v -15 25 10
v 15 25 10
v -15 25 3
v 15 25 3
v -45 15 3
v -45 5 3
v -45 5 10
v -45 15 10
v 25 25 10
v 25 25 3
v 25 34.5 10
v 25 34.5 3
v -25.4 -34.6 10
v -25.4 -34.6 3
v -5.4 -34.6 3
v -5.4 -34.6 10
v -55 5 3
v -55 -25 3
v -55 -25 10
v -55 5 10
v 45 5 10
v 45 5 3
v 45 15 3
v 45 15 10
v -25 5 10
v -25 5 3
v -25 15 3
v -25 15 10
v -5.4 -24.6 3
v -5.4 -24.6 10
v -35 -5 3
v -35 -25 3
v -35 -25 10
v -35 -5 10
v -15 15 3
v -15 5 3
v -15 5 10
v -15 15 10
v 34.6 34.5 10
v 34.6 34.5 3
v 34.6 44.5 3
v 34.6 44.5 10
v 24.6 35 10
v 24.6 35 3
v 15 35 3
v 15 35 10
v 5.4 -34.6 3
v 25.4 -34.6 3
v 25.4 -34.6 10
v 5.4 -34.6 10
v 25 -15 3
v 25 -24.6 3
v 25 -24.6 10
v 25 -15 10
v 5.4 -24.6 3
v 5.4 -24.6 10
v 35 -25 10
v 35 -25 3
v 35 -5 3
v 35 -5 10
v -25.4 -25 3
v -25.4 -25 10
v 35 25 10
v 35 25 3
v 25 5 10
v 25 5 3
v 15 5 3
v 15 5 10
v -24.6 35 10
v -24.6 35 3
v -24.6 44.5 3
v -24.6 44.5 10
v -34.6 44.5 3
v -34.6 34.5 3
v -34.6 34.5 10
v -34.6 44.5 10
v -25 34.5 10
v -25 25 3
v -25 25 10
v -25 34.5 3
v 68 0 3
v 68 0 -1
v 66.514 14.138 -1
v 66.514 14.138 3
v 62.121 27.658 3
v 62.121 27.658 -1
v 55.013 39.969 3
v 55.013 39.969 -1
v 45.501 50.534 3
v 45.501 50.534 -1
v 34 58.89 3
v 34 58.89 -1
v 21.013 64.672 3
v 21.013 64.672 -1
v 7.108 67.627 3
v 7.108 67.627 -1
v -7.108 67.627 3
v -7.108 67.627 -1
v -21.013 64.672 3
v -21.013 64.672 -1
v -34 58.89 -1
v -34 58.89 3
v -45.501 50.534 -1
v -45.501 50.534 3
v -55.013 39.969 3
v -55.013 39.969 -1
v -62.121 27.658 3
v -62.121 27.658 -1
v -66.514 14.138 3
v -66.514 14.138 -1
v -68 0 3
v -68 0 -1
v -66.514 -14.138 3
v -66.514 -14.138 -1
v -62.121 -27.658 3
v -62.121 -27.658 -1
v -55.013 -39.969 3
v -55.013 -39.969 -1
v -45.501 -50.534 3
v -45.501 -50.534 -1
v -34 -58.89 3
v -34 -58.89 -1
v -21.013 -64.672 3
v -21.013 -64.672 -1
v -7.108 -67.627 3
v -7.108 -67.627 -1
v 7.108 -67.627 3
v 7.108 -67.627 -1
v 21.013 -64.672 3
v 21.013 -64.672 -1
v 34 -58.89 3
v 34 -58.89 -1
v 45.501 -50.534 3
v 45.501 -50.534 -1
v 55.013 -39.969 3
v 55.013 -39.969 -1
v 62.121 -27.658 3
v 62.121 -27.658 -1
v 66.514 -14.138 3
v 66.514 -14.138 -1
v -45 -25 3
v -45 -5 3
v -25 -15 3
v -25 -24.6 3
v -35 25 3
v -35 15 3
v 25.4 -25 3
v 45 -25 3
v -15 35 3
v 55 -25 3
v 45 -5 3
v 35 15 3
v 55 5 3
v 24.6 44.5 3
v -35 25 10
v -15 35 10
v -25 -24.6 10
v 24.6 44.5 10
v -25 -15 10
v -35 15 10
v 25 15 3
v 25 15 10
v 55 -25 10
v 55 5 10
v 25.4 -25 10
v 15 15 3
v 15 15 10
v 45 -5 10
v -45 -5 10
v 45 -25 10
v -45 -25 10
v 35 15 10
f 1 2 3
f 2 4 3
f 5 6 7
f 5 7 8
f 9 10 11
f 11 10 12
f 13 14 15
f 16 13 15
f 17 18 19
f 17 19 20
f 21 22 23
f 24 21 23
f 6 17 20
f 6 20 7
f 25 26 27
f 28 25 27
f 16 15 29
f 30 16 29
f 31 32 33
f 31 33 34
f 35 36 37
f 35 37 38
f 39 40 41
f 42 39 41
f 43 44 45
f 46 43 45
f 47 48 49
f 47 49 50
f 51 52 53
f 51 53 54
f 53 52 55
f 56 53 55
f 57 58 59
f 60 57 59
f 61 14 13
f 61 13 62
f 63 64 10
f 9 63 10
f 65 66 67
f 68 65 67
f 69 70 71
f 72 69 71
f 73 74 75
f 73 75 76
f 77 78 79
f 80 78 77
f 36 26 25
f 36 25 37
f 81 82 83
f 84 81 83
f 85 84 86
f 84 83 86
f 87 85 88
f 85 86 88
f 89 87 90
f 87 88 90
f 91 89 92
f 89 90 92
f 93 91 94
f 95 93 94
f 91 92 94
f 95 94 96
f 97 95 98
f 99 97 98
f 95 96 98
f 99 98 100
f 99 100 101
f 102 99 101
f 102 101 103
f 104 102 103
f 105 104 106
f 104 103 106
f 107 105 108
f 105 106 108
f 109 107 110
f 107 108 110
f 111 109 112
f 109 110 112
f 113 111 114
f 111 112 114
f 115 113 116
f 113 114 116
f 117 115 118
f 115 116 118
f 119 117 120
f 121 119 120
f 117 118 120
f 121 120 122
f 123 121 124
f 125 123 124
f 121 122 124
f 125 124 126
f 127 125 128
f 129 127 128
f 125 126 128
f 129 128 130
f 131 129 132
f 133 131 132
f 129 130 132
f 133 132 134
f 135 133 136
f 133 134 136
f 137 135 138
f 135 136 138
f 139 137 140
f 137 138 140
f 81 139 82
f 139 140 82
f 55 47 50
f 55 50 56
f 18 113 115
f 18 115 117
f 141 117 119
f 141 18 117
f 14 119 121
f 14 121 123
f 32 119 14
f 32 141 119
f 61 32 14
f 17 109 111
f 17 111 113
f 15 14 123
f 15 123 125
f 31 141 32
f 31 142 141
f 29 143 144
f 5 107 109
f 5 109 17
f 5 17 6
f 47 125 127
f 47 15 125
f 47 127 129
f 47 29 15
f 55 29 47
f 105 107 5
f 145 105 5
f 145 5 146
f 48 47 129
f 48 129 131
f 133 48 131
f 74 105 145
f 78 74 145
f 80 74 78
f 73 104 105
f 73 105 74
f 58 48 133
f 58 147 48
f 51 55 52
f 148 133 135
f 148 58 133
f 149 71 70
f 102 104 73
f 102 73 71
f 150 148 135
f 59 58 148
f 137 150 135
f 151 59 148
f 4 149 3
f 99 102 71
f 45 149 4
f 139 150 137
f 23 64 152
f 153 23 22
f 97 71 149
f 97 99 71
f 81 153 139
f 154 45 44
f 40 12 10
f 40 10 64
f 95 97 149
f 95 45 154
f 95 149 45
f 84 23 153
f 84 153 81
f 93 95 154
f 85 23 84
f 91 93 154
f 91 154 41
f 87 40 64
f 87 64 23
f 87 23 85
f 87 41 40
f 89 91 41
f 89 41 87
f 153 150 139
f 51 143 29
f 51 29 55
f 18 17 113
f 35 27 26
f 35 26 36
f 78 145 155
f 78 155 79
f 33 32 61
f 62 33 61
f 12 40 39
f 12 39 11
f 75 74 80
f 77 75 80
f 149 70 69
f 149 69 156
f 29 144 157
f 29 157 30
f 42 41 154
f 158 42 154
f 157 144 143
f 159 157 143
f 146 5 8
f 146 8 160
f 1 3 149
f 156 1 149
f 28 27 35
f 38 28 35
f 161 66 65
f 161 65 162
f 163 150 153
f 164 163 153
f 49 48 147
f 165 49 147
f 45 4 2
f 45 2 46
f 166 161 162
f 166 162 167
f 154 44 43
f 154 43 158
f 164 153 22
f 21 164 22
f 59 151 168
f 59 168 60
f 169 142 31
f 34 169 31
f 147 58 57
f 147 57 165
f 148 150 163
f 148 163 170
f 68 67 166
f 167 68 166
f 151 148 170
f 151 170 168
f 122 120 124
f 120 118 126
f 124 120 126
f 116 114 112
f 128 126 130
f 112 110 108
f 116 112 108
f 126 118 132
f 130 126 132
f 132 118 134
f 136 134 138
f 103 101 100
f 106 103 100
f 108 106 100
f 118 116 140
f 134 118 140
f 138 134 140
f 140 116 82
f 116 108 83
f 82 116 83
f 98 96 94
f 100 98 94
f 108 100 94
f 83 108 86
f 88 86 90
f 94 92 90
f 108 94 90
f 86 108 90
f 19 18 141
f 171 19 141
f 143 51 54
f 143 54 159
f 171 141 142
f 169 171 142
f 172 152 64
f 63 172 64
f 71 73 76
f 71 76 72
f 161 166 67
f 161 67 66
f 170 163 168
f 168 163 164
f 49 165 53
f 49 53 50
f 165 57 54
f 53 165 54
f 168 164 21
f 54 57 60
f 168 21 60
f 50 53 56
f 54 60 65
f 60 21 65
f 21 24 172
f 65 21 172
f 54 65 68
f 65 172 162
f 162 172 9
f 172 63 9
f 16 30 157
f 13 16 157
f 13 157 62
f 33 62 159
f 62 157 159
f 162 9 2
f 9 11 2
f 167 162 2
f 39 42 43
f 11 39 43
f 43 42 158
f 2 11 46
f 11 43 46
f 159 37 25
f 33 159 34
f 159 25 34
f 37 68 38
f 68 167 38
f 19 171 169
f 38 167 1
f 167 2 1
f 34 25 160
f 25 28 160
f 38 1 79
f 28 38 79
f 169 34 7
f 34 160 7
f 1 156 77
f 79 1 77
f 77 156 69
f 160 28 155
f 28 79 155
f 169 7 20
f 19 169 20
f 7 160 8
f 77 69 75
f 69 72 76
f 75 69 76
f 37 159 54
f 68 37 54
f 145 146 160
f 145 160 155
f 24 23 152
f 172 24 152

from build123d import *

# Parameters (mm, degrees)
BOX011_W       = 10
BOX011_H       = 10
BOX011_DEPTH   = 10
BOX012_W       = 10
BOX012_H       = 10
BOX012_DEPTH   = 10
BOX001_W       = 10
BOX001_H       = 10
BOX001_DEPTH   = 10
BOX003_W       = 10
BOX003_H       = 10
BOX003_DEPTH   = 10
BOX020_W       = 10
BOX020_H       = 10
BOX020_DEPTH   = 10
BOX019_W       = 10
BOX019_H       = 10
BOX019_DEPTH   = 10
BOX024_W       = 10
BOX024_H       = 10
BOX024_DEPTH   = 10
BOX017_W       = 10
BOX017_H       = 10
BOX017_DEPTH   = 10
BOX007_W       = 10
BOX007_H       = 10
BOX007_DEPTH   = 10
BOX013_W       = 10
BOX013_H       = 10
BOX013_DEPTH   = 10
BOX006_W       = 10
BOX006_H       = 10
BOX006_DEPTH   = 10
BOX005_W       = 10
BOX005_H       = 10
BOX005_DEPTH   = 10
BOX002_W       = 10
BOX002_H       = 10
BOX002_DEPTH   = 10
BOX015_W       = 10
BOX015_H       = 10
BOX015_DEPTH   = 10
BOX023_W       = 10
BOX023_H       = 10
BOX023_DEPTH   = 10
BOX004_W       = 10
BOX004_H       = 10
BOX004_DEPTH   = 10
BOX014_W       = 10
BOX014_H       = 10
BOX014_DEPTH   = 10
BOX009_W       = 10
BOX009_H       = 10
BOX009_DEPTH   = 10
BOX016_W       = 10
BOX016_H       = 10
BOX016_DEPTH   = 10
BOX010_W       = 10
BOX010_H       = 10
BOX010_DEPTH   = 10
BOX_W          = 10
BOX_H          = 10
BOX_DEPTH      = 10
BOX022_W       = 10
BOX022_H       = 10
BOX022_DEPTH   = 10
BOX018_W       = 10
BOX018_H       = 10
BOX018_DEPTH   = 10
BOX021_W       = 10
BOX021_H       = 10
BOX021_DEPTH   = 10
BOX008_W       = 10
BOX008_H       = 10
BOX008_DEPTH   = 10
CYLINDER_R     = 68
CYLINDER_DEPTH = 4


with BuildPart() as cubo011:
    # Box011 → Box011 (new body)
    with BuildSketch(Plane(origin=(-25, -5, 0), x_dir=(1, 0, 0), z_dir=(0, 0, 1))):
        with Locations((5, 5)):
            Rectangle(BOX011_W, BOX011_H)
    extrude(amount=BOX011_DEPTH)


with BuildPart() as cubo012:
    # Box012 → Box012 (new body)
    with BuildSketch(Plane(origin=(-15, -5, 0), x_dir=(1, 0, 0), z_dir=(0, 0, 1))):
        with Locations((5, 5)):
            Rectangle(BOX012_W, BOX012_H)
    extrude(amount=BOX012_DEPTH)


with BuildPart() as cubo001:
    # Box001 → Box001 (new body)
    with BuildSketch(Plane(origin=(-34.6, 34.5, 0), x_dir=(1, 0, 0), z_dir=(0, 0, 1))):
        with Locations((5, 5)):
            Rectangle(BOX001_W, BOX001_H)
    extrude(amount=BOX001_DEPTH)


with BuildPart() as cubo003:
    # Box003 → Box003 (new body)
    with BuildSketch(Plane(origin=(-25, 15, 0), x_dir=(1, 0, 0), z_dir=(0, 0, 1))):
        with Locations((5, 5)):
            Rectangle(BOX003_W, BOX003_H)
    extrude(amount=BOX003_DEPTH)


with BuildPart() as cubo020:
    # Box020 → Box020 (new body)
    with BuildSketch(Plane(origin=(-15.4, -34.6, 0), x_dir=(1, 0, 0), z_dir=(0, 0, 1))):
        with Locations((5, 5)):
            Rectangle(BOX020_W, BOX020_H)
    extrude(amount=BOX020_DEPTH)


with BuildPart() as cubo019:
    # Box019 → Box019 (new body)
    with BuildSketch(Plane(origin=(-25.4, -34.6, 0), x_dir=(1, 0, 0), z_dir=(0, 0, 1))):
        with Locations((5, 5)):
            Rectangle(BOX019_W, BOX019_H)
    extrude(amount=BOX019_DEPTH)


with BuildPart() as cubo024:
    # Box024 → Box024 (new body)
    with BuildSketch(Plane(origin=(-5, -15, 0), x_dir=(1, 0, 0), z_dir=(0, 0, 1))):
        with Locations((5, 5)):
            Rectangle(BOX024_W, BOX024_H)
    extrude(amount=BOX024_DEPTH)


with BuildPart() as cubo017:
    # Box017 → Box017 (new body)
    with BuildSketch(Plane(origin=(-25, -15, 0), x_dir=(1, 0, 0), z_dir=(0, 0, 1))):
        with Locations((5, 5)):
            Rectangle(BOX017_W, BOX017_H)
    extrude(amount=BOX017_DEPTH)


with BuildPart() as cubo007:
    # Box007 → Box007 (new body)
    with BuildSketch(Plane(origin=(-15, 5, 0), x_dir=(1, 0, 0), z_dir=(0, 0, 1))):
        with Locations((5, 5)):
            Rectangle(BOX007_W, BOX007_H)
    extrude(amount=BOX007_DEPTH)


with BuildPart() as cubo013:
    # Box013 → Box013 (new body)
    with BuildSketch(Plane(origin=(-55, -15, 0), x_dir=(1, 0, 0), z_dir=(0, 0, 1))):
        with Locations((5, 5)):
            Rectangle(BOX013_W, BOX013_H)
    extrude(amount=BOX013_DEPTH)


with BuildPart() as cubo006:
    # Box006 → Box006 (new body)
    with BuildSketch(Plane(origin=(-35, 5, 0), x_dir=(1, 0, 0), z_dir=(0, 0, 1))):
        with Locations((5, 5)):
            Rectangle(BOX006_W, BOX006_H)
    extrude(amount=BOX006_DEPTH)


with BuildPart() as cubo005:
    # Box005 → Box005 (new body)
    with BuildSketch(Plane(origin=(-45, 5, 0), x_dir=(1, 0, 0), z_dir=(0, 0, 1))):
        with Locations((5, 5)):
            Rectangle(BOX005_W, BOX005_H)
    extrude(amount=BOX005_DEPTH)


with BuildPart() as cubo002:
    # Box002 → Box002 (new body)
    with BuildSketch(Plane(origin=(-25, 25, 0), x_dir=(1, 0, 0), z_dir=(0, 0, 1))):
        with Locations((5, 5)):
            Rectangle(BOX002_W, BOX002_H)
    extrude(amount=BOX002_DEPTH)


with BuildPart() as cubo015:
    # Box015 → Box015 (new body)
    with BuildSketch(Plane(origin=(-35, -15, 0), x_dir=(1, 0, 0), z_dir=(0, 0, 1))):
        with Locations((5, 5)):
            Rectangle(BOX015_W, BOX015_H)
    extrude(amount=BOX015_DEPTH)


with BuildPart() as cubo023:
    # Box023 → Box023 (new body)
    with BuildSketch(Plane(origin=(-5, -5, 0), x_dir=(1, 0, 0), z_dir=(0, 0, 1))):
        with Locations((5, 5)):
            Rectangle(BOX023_W, BOX023_H)
    extrude(amount=BOX023_DEPTH)


with BuildPart() as cubo004:
    # Box004 → Box004 (new body)
    with BuildSketch(Plane(origin=(-15, 15, 0), x_dir=(1, 0, 0), z_dir=(0, 0, 1))):
        with Locations((5, 5)):
            Rectangle(BOX004_W, BOX004_H)
    extrude(amount=BOX004_DEPTH)


with BuildPart() as cubo014:
    # Box014 → Box014 (new body)
    with BuildSketch(Plane(origin=(-55, -25, 0), x_dir=(1, 0, 0), z_dir=(0, 0, 1))):
        with Locations((5, 5)):
            Rectangle(BOX014_W, BOX014_H)
    extrude(amount=BOX014_DEPTH)


with BuildPart() as cubo009:
    # Box009 → Box009 (new body)
    with BuildSketch(Plane(origin=(-45, -5, 0), x_dir=(1, 0, 0), z_dir=(0, 0, 1))):
        with Locations((5, 5)):
            Rectangle(BOX009_W, BOX009_H)
    extrude(amount=BOX009_DEPTH)


with BuildPart() as cubo016:
    # Box016 → Box016 (new body)
    with BuildSketch(Plane(origin=(-35, -25, 0), x_dir=(1, 0, 0), z_dir=(0, 0, 1))):
        with Locations((5, 5)):
            Rectangle(BOX016_W, BOX016_H)
    extrude(amount=BOX016_DEPTH)


with BuildPart() as cubo010:
    # Box010 → Box010 (new body)
    with BuildSketch(Plane(origin=(-35, -5, 0), x_dir=(1, 0, 0), z_dir=(0, 0, 1))):
        with Locations((5, 5)):
            Rectangle(BOX010_W, BOX010_H)
    extrude(amount=BOX010_DEPTH)


with BuildPart() as cubo:
    # Box → Box (new body)
    with BuildSketch(Plane(origin=(-35, 15, 0), x_dir=(1, 0, 0), z_dir=(0, 0, 1))):
        with Locations((5, 5)):
            Rectangle(BOX_W, BOX_H)
    extrude(amount=BOX_DEPTH)


with BuildPart() as cubo022:
    # Box022 → Box022 (new body)
    with BuildSketch(Plane(origin=(-5, 5, 0), x_dir=(1, 0, 0), z_dir=(0, 0, 1))):
        with Locations((5, 5)):
            Rectangle(BOX022_W, BOX022_H)
    extrude(amount=BOX022_DEPTH)


with BuildPart() as cubo018:
    # Box018 → Box018 (new body)
    with BuildSketch(Plane(origin=(-15, -15, 0), x_dir=(1, 0, 0), z_dir=(0, 0, 1))):
        with Locations((5, 5)):
            Rectangle(BOX018_W, BOX018_H)
    extrude(amount=BOX018_DEPTH)


with BuildPart() as cubo021:
    # Box021 → Box021 (new body)
    with BuildSketch(Plane(origin=(-5, 15, 0), x_dir=(1, 0, 0), z_dir=(0, 0, 1))):
        with Locations((5, 5)):
            Rectangle(BOX021_W, BOX021_H)
    extrude(amount=BOX021_DEPTH)


with BuildPart() as lado_izdo:
    # Box008 → Box008 (new body)
    with BuildSketch(Plane(origin=(-55, -5, 0), x_dir=(1, 0, 0), z_dir=(0, 0, 1))):
        with Locations((5, 5)):
            Rectangle(BOX008_W, BOX008_H)
    extrude(amount=BOX008_DEPTH)

    # Fusion: union Cubo011, Cubo012, Cubo001, Cubo003, Cubo020, Cubo019, Cubo024, Cubo017, Cubo007, Cubo013, Cubo006, Cubo005, Cubo002, Cubo015, Cubo023, Cubo004, Cubo014, Cubo009, Cubo016, Cubo010, Cubo, Cubo022, Cubo018, Cubo021
    add(cubo011.part)
    add(cubo012.part)
    add(cubo001.part)
    add(cubo003.part)
    add(cubo020.part)
    add(cubo019.part)
    add(cubo024.part)
    add(cubo017.part)
    add(cubo007.part)
    add(cubo013.part)
    add(cubo006.part)
    add(cubo005.part)
    add(cubo002.part)
    add(cubo015.part)
    add(cubo023.part)
    add(cubo004.part)
    add(cubo014.part)
    add(cubo009.part)
    add(cubo016.part)
    add(cubo010.part)
    add(cubo.part)
    add(cubo022.part)
    add(cubo018.part)
    add(cubo021.part)


with BuildPart() as invaders:
    # Part__Mirroring: instance of Lado-izdo
    add(lado_izdo.part.mirror(Plane(origin=(0, 0, 0), x_dir=(0, -1, 0), z_dir=(1, 0, 0))))

    # Fusion001: union Lado-izdo
    add(lado_izdo.part)


with BuildPart() as invaders_final:
    # Cylinder → Cylinder (new body)
    with BuildSketch(Plane.XY.offset(-1)):
        Circle(CYLINDER_R)
    extrude(amount=CYLINDER_DEPTH)

    # Fusion002: union Invaders
    add(invaders.part)


solid = invaders_final.part
